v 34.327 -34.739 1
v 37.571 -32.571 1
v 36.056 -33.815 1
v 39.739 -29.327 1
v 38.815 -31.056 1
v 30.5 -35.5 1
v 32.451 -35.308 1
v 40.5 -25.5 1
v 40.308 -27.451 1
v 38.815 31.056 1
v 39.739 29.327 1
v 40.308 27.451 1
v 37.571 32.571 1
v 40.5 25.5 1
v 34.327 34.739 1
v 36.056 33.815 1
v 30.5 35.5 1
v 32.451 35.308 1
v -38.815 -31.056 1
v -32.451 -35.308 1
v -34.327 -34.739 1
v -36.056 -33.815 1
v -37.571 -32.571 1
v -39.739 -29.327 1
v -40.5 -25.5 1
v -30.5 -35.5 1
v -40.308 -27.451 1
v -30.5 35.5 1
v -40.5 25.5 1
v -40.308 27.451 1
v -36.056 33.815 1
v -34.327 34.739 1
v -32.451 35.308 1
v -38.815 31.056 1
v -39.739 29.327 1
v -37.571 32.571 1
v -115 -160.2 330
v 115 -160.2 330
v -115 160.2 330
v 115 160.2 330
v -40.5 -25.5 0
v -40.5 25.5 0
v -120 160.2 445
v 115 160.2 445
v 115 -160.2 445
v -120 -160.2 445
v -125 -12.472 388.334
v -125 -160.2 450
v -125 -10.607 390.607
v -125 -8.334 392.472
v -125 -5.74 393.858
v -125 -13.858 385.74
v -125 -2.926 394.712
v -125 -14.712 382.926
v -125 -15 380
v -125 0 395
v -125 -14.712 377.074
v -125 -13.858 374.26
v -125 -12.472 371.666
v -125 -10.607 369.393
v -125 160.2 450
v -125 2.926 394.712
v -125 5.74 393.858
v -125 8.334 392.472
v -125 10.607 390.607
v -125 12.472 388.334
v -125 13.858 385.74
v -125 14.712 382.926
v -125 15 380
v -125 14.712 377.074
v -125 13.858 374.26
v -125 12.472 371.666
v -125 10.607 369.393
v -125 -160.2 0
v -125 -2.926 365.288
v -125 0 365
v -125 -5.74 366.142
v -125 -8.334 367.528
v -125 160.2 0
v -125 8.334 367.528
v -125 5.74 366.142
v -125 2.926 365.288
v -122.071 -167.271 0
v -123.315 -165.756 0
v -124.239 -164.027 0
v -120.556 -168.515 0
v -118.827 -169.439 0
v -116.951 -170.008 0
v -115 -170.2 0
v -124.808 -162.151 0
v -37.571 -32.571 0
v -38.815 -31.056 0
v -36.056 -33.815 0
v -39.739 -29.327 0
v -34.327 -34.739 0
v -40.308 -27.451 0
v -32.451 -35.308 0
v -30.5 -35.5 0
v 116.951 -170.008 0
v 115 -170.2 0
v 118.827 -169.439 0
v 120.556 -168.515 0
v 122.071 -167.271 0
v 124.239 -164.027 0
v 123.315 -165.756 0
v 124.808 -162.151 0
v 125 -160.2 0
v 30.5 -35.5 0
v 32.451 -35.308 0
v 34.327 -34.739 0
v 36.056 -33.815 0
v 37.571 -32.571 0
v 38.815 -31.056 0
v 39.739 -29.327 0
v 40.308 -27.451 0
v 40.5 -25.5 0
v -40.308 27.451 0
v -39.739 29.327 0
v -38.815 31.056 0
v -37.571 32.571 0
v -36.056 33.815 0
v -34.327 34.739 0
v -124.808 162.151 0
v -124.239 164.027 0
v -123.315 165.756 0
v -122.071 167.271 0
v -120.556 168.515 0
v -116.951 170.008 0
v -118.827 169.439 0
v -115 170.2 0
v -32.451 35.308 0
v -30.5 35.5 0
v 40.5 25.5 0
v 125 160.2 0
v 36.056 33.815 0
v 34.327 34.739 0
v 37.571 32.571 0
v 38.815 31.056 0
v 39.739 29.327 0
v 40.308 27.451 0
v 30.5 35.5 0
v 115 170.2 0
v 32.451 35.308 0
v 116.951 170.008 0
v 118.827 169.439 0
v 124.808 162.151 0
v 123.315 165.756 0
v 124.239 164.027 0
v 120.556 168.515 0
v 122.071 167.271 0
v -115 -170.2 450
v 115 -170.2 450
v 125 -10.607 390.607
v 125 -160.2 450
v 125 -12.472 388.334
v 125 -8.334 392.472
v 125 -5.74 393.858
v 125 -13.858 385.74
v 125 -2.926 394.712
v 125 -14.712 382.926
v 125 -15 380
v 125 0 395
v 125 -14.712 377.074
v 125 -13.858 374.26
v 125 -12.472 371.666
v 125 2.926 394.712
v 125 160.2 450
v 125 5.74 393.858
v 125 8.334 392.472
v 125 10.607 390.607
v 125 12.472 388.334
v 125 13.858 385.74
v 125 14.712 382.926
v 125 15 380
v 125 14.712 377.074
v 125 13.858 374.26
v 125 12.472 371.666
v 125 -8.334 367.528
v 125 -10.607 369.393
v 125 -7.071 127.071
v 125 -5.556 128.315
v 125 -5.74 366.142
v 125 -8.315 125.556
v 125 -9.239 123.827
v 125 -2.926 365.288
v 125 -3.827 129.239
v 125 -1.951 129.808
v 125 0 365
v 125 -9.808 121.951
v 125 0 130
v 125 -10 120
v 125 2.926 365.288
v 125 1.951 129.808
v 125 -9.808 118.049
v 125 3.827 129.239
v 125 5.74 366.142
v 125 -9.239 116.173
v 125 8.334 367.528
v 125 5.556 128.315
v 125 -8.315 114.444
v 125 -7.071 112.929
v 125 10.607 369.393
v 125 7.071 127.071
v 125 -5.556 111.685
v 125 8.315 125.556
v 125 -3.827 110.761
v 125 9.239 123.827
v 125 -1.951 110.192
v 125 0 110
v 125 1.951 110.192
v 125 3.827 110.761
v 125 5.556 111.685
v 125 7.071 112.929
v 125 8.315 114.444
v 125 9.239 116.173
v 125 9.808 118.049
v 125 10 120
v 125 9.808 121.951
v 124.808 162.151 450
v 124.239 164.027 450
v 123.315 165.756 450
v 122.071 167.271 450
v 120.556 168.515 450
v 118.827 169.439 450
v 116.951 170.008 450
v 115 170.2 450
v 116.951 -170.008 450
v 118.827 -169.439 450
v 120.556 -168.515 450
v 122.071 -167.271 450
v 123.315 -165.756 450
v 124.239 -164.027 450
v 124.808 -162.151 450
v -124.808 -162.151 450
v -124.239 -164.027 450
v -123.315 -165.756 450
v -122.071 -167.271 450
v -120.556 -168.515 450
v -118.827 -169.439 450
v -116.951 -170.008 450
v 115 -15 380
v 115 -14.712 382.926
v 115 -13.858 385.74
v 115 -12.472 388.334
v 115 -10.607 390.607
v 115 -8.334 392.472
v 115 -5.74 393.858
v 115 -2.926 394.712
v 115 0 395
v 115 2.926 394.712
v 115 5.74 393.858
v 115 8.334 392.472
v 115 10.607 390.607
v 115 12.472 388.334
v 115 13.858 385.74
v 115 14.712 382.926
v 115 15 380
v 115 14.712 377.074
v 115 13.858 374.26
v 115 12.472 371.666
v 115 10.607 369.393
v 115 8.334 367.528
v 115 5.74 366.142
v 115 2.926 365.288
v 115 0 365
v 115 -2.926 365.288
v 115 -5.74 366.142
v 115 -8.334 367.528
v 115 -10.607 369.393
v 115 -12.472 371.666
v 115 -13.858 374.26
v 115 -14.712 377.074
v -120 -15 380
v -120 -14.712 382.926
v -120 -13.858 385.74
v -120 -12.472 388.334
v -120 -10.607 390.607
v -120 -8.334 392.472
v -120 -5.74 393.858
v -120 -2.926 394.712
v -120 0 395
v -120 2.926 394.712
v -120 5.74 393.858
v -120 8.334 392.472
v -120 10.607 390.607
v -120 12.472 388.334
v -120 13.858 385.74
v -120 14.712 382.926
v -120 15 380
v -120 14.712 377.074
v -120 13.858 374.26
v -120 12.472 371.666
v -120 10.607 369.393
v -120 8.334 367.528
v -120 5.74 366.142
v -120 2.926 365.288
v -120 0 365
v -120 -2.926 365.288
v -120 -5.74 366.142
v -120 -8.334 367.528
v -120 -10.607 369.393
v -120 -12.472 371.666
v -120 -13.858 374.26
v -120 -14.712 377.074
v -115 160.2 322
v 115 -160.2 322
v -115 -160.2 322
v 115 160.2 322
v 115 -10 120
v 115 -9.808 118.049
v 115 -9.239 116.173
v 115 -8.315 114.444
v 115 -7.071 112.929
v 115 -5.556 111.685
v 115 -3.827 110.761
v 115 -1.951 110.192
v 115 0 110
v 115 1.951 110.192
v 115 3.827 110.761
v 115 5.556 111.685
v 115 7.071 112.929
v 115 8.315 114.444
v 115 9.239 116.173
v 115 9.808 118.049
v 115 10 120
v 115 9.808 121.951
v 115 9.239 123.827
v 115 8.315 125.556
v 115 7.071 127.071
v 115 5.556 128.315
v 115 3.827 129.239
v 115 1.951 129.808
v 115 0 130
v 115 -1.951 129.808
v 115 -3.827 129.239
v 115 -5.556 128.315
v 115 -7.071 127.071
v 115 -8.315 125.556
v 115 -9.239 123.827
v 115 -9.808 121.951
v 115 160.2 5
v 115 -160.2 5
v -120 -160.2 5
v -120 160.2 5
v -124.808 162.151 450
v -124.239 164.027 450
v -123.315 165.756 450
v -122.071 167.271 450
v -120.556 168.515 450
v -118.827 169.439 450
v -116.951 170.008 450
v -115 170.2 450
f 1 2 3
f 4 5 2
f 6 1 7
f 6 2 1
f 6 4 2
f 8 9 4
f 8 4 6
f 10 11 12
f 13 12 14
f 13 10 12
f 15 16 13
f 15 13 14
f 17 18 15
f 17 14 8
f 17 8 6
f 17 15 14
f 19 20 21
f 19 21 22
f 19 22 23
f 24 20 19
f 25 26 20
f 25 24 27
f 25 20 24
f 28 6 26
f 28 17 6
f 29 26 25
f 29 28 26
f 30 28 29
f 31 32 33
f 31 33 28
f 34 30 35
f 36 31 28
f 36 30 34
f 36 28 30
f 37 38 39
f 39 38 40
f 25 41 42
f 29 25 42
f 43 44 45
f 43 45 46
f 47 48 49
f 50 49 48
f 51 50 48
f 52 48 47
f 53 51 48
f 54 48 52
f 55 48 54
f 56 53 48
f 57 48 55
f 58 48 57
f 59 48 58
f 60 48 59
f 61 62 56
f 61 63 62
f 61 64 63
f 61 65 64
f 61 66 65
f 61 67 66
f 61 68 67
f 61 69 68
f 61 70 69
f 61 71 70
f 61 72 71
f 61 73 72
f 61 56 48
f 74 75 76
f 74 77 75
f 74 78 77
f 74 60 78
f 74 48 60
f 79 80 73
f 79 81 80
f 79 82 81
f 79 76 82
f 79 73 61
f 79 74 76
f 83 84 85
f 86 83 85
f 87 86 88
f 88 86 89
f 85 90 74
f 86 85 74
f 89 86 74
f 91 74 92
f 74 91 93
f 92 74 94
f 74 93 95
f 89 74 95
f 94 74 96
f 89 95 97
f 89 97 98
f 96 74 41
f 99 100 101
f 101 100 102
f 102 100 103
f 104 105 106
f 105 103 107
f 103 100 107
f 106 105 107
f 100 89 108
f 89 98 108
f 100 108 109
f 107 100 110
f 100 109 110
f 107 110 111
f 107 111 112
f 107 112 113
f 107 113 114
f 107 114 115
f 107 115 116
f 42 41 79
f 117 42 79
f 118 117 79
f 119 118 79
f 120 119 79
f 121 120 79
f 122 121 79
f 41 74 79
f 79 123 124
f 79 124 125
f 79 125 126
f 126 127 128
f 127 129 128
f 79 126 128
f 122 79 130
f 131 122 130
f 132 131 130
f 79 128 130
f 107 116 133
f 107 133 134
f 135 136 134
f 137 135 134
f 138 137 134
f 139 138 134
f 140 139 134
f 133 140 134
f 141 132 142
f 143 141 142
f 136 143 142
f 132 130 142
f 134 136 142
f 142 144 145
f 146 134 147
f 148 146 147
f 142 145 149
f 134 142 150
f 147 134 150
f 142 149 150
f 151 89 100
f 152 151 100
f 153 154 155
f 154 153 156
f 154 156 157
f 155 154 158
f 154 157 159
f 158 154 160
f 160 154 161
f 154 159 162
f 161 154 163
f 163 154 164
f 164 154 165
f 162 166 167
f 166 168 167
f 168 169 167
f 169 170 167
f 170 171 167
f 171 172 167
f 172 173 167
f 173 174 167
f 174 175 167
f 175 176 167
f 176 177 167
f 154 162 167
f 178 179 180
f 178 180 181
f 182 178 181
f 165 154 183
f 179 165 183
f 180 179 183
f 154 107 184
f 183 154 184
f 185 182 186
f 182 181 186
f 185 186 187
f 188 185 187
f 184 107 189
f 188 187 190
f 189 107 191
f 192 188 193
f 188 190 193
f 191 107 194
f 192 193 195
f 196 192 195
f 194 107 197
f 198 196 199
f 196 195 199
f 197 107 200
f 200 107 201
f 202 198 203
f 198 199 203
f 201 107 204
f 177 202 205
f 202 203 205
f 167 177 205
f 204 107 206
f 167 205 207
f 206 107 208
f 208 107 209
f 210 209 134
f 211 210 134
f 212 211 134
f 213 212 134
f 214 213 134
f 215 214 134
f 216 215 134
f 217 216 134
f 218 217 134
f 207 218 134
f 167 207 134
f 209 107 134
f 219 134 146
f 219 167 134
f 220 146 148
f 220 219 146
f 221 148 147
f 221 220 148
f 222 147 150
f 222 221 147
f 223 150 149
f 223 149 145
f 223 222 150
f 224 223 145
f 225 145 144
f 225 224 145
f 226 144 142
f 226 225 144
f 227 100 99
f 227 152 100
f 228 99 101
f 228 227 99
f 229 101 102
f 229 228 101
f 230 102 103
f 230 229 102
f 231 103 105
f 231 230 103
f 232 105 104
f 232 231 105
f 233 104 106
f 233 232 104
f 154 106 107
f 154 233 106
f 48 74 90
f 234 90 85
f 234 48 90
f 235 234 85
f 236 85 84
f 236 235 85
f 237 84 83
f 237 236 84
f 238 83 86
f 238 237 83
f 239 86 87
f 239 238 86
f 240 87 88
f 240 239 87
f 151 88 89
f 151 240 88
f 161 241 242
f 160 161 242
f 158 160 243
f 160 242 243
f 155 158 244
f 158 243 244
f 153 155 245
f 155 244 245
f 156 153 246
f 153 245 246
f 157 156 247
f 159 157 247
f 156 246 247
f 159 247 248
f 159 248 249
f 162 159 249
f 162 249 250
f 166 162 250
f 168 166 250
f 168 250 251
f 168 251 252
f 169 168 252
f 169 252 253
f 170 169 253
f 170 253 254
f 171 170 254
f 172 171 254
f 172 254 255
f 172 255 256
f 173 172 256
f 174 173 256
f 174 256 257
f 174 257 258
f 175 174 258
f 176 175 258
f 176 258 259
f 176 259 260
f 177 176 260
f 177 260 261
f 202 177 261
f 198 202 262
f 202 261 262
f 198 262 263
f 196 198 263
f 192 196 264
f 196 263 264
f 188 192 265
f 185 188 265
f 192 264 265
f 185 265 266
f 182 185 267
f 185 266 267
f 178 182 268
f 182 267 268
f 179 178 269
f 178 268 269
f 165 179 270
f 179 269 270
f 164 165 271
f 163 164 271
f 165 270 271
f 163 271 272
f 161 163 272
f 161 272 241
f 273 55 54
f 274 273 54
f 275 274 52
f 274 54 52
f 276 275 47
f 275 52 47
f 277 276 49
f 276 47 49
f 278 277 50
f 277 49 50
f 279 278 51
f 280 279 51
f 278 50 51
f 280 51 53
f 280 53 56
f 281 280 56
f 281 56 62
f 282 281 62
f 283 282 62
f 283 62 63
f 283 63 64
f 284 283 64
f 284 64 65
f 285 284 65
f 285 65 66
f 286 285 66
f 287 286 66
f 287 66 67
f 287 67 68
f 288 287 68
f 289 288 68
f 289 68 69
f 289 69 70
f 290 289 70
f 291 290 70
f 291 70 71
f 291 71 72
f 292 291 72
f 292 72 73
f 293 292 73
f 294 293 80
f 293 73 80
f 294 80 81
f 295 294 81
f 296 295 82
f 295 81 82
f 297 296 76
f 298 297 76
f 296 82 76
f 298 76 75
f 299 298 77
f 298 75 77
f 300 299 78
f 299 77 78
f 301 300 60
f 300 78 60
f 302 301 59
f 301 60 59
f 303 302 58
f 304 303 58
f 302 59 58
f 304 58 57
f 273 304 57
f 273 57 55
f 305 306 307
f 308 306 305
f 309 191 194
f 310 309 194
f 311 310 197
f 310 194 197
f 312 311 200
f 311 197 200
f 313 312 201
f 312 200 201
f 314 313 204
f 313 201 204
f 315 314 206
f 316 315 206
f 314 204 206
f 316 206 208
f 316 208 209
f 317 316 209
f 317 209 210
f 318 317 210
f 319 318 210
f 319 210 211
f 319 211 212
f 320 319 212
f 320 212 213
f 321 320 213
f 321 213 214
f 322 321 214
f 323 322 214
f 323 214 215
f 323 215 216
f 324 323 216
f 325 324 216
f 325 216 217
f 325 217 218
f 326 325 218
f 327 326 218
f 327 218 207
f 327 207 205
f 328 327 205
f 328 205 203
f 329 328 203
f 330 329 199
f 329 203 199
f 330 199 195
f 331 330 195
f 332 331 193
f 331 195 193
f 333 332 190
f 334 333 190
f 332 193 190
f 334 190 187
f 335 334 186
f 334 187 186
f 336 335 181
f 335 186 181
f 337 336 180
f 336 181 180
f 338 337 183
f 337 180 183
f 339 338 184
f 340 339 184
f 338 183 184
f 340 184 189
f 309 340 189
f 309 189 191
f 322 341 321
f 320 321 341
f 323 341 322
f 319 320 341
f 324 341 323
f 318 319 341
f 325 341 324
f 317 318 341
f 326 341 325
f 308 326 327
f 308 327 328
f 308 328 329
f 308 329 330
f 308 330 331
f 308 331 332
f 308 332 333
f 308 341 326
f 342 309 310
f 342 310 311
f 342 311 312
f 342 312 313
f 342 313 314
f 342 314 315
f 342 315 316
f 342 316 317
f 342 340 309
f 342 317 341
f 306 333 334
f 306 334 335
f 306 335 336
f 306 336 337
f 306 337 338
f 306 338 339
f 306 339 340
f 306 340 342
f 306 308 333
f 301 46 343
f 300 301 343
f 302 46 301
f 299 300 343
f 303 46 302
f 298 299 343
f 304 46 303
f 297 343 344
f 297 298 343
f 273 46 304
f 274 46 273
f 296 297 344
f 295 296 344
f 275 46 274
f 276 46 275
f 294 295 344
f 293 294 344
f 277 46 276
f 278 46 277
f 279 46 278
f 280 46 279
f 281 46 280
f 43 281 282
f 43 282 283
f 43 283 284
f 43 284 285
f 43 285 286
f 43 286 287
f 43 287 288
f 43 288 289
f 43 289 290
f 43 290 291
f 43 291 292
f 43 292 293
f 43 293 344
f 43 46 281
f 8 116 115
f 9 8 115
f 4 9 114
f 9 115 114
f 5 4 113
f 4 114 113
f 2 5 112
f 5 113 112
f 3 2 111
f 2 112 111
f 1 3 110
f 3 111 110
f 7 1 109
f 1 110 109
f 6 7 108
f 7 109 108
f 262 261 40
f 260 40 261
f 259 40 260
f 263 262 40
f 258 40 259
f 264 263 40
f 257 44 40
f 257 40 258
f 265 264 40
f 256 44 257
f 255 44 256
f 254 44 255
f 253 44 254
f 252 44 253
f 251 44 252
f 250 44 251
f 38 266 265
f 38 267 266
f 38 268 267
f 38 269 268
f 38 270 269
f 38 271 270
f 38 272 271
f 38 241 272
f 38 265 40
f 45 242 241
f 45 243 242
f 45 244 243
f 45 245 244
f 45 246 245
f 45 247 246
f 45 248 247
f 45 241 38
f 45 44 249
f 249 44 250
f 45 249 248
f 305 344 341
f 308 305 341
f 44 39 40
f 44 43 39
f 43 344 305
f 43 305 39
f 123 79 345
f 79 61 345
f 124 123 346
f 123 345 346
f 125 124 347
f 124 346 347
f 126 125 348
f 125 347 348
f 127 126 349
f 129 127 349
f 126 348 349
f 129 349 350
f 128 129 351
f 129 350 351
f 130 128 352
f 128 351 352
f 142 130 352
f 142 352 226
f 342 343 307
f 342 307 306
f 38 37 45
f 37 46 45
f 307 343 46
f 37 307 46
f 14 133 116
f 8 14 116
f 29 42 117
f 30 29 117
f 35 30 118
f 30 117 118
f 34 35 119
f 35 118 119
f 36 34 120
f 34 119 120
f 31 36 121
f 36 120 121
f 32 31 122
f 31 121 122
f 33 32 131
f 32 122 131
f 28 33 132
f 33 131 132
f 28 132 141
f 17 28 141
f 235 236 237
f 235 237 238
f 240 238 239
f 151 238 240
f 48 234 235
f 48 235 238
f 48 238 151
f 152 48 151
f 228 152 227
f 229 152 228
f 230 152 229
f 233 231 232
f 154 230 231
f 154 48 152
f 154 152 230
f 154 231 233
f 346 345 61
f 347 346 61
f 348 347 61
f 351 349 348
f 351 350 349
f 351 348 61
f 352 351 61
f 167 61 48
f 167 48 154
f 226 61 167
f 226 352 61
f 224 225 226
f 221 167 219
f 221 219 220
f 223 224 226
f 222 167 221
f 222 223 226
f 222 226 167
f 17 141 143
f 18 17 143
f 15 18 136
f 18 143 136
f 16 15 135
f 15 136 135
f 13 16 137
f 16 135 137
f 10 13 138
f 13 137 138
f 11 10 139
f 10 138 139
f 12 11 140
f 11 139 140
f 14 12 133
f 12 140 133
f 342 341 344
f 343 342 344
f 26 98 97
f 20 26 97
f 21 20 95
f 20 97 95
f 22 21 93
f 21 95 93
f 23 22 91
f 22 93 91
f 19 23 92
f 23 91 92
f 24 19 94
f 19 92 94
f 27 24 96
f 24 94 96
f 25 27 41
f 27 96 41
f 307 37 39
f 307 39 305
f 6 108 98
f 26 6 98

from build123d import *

# Parameters (mm, degrees)
SKETCH_1_W          = 250
SKETCH_1_H          = 340.4
EXTRUDE_1_DEPTH     = 450
FILLET_1_R          = 10
SKETCH_4_R          = 10
CUT_EXTRUDE_1_DEPTH = 50
CUT_EXTRUDE_2_DEPTH = 1
CUT_EXTRUDE_START   = -5
CUT_EXTRUDE_3_DEPTH = 440
SKETCH_8_R          = 15
CUT_EXTRUDE_4_DEPTH = 543.188196109
EXTRUDE_START       = -5
SKETCH_11_W         = 8
SKETCH_11_H         = 320.4
EXTRUDE_2_DEPTH     = 235


with BuildPart() as part:
    # 草图1 → 凸台-拉伸1 (new body)
    with BuildSketch(Plane.XY):
        Rectangle(SKETCH_1_W, SKETCH_1_H)
    extrude(amount=EXTRUDE_1_DEPTH)

    # 圆角1
    fillet_1_edges = [part.edges().sort_by_distance(p)[0] for p in [
        (125, -170.2, 225),
        (-125, -170.2, 225),
        (-125, 170.2, 225),
        (125, 170.2, 225),
    ]]
    fillet(fillet_1_edges, radius=FILLET_1_R)

    # 草图4 → 切除-拉伸1 (cut)
    with BuildSketch(Plane(origin=(125, 0, 0), x_dir=(0, 0, -1), z_dir=(1, 0, 0))):
        with Locations(Location((-120, 0, 0), (0, 0, 270))):
            Circle(SKETCH_4_R)
    extrude(amount=-CUT_EXTRUDE_1_DEPTH, mode=Mode.SUBTRACT)

    # 草图5 → 切除-拉伸2 (cut)
    with BuildSketch(Plane(origin=(0, 0, 0), x_dir=(-1, 0, 0), z_dir=(0, 0, -1))):
        with BuildLine():
            Line((-30.5, -35.5), (30.5, -35.5))
            ThreePointArc((30.5, -35.5), (37.571067812, -32.571067812), (40.5, -25.5))
            Line((40.5, -25.5), (40.5, 25.5))
            ThreePointArc((40.5, 25.5), (37.571067812, 32.571067812), (30.5, 35.5))
            Line((30.5, 35.5), (-30.5, 35.5))
            ThreePointArc((-30.5, 35.5), (-37.571067812, 32.571067812), (-40.5, 25.5))
            Line((-40.5, 25.5), (-40.5, -25.5))
            ThreePointArc((-40.5, -25.5), (-37.571067812, -32.571067812), (-30.5, -35.5))
        make_face()
    extrude(amount=-CUT_EXTRUDE_2_DEPTH, mode=Mode.SUBTRACT)

    # 草图7 → 切除-拉伸3 (cut)
    with BuildSketch(Plane.XY.offset(450).offset(CUT_EXTRUDE_START)):
        Polygon((-120, -160.2), (-120, 160.2), (115, 160.2), (115, -160.2), (-18.295526733, -160.2), align=None)
    extrude(amount=-CUT_EXTRUDE_3_DEPTH, mode=Mode.SUBTRACT)

    # 草图8 → 切除-拉伸4 (cut, through all)
    with BuildSketch(Plane.ZY.offset(125)):
        with Locations(Location((380, 0, 0), (0, 0, 270))):
            Circle(SKETCH_8_R)
    extrude(amount=-CUT_EXTRUDE_4_DEPTH, mode=Mode.SUBTRACT)

    # 草图11 → 凸台-拉伸2 (add)
    with BuildSketch(Plane(origin=(125, 0, 0), x_dir=(0, 0, -1), z_dir=(1, 0, 0)).offset(EXTRUDE_START)):
        with Locations((-326, 0)):
            Rectangle(SKETCH_11_W, SKETCH_11_H)
    extrude(amount=-EXTRUDE_2_DEPTH)


solid = part.part
